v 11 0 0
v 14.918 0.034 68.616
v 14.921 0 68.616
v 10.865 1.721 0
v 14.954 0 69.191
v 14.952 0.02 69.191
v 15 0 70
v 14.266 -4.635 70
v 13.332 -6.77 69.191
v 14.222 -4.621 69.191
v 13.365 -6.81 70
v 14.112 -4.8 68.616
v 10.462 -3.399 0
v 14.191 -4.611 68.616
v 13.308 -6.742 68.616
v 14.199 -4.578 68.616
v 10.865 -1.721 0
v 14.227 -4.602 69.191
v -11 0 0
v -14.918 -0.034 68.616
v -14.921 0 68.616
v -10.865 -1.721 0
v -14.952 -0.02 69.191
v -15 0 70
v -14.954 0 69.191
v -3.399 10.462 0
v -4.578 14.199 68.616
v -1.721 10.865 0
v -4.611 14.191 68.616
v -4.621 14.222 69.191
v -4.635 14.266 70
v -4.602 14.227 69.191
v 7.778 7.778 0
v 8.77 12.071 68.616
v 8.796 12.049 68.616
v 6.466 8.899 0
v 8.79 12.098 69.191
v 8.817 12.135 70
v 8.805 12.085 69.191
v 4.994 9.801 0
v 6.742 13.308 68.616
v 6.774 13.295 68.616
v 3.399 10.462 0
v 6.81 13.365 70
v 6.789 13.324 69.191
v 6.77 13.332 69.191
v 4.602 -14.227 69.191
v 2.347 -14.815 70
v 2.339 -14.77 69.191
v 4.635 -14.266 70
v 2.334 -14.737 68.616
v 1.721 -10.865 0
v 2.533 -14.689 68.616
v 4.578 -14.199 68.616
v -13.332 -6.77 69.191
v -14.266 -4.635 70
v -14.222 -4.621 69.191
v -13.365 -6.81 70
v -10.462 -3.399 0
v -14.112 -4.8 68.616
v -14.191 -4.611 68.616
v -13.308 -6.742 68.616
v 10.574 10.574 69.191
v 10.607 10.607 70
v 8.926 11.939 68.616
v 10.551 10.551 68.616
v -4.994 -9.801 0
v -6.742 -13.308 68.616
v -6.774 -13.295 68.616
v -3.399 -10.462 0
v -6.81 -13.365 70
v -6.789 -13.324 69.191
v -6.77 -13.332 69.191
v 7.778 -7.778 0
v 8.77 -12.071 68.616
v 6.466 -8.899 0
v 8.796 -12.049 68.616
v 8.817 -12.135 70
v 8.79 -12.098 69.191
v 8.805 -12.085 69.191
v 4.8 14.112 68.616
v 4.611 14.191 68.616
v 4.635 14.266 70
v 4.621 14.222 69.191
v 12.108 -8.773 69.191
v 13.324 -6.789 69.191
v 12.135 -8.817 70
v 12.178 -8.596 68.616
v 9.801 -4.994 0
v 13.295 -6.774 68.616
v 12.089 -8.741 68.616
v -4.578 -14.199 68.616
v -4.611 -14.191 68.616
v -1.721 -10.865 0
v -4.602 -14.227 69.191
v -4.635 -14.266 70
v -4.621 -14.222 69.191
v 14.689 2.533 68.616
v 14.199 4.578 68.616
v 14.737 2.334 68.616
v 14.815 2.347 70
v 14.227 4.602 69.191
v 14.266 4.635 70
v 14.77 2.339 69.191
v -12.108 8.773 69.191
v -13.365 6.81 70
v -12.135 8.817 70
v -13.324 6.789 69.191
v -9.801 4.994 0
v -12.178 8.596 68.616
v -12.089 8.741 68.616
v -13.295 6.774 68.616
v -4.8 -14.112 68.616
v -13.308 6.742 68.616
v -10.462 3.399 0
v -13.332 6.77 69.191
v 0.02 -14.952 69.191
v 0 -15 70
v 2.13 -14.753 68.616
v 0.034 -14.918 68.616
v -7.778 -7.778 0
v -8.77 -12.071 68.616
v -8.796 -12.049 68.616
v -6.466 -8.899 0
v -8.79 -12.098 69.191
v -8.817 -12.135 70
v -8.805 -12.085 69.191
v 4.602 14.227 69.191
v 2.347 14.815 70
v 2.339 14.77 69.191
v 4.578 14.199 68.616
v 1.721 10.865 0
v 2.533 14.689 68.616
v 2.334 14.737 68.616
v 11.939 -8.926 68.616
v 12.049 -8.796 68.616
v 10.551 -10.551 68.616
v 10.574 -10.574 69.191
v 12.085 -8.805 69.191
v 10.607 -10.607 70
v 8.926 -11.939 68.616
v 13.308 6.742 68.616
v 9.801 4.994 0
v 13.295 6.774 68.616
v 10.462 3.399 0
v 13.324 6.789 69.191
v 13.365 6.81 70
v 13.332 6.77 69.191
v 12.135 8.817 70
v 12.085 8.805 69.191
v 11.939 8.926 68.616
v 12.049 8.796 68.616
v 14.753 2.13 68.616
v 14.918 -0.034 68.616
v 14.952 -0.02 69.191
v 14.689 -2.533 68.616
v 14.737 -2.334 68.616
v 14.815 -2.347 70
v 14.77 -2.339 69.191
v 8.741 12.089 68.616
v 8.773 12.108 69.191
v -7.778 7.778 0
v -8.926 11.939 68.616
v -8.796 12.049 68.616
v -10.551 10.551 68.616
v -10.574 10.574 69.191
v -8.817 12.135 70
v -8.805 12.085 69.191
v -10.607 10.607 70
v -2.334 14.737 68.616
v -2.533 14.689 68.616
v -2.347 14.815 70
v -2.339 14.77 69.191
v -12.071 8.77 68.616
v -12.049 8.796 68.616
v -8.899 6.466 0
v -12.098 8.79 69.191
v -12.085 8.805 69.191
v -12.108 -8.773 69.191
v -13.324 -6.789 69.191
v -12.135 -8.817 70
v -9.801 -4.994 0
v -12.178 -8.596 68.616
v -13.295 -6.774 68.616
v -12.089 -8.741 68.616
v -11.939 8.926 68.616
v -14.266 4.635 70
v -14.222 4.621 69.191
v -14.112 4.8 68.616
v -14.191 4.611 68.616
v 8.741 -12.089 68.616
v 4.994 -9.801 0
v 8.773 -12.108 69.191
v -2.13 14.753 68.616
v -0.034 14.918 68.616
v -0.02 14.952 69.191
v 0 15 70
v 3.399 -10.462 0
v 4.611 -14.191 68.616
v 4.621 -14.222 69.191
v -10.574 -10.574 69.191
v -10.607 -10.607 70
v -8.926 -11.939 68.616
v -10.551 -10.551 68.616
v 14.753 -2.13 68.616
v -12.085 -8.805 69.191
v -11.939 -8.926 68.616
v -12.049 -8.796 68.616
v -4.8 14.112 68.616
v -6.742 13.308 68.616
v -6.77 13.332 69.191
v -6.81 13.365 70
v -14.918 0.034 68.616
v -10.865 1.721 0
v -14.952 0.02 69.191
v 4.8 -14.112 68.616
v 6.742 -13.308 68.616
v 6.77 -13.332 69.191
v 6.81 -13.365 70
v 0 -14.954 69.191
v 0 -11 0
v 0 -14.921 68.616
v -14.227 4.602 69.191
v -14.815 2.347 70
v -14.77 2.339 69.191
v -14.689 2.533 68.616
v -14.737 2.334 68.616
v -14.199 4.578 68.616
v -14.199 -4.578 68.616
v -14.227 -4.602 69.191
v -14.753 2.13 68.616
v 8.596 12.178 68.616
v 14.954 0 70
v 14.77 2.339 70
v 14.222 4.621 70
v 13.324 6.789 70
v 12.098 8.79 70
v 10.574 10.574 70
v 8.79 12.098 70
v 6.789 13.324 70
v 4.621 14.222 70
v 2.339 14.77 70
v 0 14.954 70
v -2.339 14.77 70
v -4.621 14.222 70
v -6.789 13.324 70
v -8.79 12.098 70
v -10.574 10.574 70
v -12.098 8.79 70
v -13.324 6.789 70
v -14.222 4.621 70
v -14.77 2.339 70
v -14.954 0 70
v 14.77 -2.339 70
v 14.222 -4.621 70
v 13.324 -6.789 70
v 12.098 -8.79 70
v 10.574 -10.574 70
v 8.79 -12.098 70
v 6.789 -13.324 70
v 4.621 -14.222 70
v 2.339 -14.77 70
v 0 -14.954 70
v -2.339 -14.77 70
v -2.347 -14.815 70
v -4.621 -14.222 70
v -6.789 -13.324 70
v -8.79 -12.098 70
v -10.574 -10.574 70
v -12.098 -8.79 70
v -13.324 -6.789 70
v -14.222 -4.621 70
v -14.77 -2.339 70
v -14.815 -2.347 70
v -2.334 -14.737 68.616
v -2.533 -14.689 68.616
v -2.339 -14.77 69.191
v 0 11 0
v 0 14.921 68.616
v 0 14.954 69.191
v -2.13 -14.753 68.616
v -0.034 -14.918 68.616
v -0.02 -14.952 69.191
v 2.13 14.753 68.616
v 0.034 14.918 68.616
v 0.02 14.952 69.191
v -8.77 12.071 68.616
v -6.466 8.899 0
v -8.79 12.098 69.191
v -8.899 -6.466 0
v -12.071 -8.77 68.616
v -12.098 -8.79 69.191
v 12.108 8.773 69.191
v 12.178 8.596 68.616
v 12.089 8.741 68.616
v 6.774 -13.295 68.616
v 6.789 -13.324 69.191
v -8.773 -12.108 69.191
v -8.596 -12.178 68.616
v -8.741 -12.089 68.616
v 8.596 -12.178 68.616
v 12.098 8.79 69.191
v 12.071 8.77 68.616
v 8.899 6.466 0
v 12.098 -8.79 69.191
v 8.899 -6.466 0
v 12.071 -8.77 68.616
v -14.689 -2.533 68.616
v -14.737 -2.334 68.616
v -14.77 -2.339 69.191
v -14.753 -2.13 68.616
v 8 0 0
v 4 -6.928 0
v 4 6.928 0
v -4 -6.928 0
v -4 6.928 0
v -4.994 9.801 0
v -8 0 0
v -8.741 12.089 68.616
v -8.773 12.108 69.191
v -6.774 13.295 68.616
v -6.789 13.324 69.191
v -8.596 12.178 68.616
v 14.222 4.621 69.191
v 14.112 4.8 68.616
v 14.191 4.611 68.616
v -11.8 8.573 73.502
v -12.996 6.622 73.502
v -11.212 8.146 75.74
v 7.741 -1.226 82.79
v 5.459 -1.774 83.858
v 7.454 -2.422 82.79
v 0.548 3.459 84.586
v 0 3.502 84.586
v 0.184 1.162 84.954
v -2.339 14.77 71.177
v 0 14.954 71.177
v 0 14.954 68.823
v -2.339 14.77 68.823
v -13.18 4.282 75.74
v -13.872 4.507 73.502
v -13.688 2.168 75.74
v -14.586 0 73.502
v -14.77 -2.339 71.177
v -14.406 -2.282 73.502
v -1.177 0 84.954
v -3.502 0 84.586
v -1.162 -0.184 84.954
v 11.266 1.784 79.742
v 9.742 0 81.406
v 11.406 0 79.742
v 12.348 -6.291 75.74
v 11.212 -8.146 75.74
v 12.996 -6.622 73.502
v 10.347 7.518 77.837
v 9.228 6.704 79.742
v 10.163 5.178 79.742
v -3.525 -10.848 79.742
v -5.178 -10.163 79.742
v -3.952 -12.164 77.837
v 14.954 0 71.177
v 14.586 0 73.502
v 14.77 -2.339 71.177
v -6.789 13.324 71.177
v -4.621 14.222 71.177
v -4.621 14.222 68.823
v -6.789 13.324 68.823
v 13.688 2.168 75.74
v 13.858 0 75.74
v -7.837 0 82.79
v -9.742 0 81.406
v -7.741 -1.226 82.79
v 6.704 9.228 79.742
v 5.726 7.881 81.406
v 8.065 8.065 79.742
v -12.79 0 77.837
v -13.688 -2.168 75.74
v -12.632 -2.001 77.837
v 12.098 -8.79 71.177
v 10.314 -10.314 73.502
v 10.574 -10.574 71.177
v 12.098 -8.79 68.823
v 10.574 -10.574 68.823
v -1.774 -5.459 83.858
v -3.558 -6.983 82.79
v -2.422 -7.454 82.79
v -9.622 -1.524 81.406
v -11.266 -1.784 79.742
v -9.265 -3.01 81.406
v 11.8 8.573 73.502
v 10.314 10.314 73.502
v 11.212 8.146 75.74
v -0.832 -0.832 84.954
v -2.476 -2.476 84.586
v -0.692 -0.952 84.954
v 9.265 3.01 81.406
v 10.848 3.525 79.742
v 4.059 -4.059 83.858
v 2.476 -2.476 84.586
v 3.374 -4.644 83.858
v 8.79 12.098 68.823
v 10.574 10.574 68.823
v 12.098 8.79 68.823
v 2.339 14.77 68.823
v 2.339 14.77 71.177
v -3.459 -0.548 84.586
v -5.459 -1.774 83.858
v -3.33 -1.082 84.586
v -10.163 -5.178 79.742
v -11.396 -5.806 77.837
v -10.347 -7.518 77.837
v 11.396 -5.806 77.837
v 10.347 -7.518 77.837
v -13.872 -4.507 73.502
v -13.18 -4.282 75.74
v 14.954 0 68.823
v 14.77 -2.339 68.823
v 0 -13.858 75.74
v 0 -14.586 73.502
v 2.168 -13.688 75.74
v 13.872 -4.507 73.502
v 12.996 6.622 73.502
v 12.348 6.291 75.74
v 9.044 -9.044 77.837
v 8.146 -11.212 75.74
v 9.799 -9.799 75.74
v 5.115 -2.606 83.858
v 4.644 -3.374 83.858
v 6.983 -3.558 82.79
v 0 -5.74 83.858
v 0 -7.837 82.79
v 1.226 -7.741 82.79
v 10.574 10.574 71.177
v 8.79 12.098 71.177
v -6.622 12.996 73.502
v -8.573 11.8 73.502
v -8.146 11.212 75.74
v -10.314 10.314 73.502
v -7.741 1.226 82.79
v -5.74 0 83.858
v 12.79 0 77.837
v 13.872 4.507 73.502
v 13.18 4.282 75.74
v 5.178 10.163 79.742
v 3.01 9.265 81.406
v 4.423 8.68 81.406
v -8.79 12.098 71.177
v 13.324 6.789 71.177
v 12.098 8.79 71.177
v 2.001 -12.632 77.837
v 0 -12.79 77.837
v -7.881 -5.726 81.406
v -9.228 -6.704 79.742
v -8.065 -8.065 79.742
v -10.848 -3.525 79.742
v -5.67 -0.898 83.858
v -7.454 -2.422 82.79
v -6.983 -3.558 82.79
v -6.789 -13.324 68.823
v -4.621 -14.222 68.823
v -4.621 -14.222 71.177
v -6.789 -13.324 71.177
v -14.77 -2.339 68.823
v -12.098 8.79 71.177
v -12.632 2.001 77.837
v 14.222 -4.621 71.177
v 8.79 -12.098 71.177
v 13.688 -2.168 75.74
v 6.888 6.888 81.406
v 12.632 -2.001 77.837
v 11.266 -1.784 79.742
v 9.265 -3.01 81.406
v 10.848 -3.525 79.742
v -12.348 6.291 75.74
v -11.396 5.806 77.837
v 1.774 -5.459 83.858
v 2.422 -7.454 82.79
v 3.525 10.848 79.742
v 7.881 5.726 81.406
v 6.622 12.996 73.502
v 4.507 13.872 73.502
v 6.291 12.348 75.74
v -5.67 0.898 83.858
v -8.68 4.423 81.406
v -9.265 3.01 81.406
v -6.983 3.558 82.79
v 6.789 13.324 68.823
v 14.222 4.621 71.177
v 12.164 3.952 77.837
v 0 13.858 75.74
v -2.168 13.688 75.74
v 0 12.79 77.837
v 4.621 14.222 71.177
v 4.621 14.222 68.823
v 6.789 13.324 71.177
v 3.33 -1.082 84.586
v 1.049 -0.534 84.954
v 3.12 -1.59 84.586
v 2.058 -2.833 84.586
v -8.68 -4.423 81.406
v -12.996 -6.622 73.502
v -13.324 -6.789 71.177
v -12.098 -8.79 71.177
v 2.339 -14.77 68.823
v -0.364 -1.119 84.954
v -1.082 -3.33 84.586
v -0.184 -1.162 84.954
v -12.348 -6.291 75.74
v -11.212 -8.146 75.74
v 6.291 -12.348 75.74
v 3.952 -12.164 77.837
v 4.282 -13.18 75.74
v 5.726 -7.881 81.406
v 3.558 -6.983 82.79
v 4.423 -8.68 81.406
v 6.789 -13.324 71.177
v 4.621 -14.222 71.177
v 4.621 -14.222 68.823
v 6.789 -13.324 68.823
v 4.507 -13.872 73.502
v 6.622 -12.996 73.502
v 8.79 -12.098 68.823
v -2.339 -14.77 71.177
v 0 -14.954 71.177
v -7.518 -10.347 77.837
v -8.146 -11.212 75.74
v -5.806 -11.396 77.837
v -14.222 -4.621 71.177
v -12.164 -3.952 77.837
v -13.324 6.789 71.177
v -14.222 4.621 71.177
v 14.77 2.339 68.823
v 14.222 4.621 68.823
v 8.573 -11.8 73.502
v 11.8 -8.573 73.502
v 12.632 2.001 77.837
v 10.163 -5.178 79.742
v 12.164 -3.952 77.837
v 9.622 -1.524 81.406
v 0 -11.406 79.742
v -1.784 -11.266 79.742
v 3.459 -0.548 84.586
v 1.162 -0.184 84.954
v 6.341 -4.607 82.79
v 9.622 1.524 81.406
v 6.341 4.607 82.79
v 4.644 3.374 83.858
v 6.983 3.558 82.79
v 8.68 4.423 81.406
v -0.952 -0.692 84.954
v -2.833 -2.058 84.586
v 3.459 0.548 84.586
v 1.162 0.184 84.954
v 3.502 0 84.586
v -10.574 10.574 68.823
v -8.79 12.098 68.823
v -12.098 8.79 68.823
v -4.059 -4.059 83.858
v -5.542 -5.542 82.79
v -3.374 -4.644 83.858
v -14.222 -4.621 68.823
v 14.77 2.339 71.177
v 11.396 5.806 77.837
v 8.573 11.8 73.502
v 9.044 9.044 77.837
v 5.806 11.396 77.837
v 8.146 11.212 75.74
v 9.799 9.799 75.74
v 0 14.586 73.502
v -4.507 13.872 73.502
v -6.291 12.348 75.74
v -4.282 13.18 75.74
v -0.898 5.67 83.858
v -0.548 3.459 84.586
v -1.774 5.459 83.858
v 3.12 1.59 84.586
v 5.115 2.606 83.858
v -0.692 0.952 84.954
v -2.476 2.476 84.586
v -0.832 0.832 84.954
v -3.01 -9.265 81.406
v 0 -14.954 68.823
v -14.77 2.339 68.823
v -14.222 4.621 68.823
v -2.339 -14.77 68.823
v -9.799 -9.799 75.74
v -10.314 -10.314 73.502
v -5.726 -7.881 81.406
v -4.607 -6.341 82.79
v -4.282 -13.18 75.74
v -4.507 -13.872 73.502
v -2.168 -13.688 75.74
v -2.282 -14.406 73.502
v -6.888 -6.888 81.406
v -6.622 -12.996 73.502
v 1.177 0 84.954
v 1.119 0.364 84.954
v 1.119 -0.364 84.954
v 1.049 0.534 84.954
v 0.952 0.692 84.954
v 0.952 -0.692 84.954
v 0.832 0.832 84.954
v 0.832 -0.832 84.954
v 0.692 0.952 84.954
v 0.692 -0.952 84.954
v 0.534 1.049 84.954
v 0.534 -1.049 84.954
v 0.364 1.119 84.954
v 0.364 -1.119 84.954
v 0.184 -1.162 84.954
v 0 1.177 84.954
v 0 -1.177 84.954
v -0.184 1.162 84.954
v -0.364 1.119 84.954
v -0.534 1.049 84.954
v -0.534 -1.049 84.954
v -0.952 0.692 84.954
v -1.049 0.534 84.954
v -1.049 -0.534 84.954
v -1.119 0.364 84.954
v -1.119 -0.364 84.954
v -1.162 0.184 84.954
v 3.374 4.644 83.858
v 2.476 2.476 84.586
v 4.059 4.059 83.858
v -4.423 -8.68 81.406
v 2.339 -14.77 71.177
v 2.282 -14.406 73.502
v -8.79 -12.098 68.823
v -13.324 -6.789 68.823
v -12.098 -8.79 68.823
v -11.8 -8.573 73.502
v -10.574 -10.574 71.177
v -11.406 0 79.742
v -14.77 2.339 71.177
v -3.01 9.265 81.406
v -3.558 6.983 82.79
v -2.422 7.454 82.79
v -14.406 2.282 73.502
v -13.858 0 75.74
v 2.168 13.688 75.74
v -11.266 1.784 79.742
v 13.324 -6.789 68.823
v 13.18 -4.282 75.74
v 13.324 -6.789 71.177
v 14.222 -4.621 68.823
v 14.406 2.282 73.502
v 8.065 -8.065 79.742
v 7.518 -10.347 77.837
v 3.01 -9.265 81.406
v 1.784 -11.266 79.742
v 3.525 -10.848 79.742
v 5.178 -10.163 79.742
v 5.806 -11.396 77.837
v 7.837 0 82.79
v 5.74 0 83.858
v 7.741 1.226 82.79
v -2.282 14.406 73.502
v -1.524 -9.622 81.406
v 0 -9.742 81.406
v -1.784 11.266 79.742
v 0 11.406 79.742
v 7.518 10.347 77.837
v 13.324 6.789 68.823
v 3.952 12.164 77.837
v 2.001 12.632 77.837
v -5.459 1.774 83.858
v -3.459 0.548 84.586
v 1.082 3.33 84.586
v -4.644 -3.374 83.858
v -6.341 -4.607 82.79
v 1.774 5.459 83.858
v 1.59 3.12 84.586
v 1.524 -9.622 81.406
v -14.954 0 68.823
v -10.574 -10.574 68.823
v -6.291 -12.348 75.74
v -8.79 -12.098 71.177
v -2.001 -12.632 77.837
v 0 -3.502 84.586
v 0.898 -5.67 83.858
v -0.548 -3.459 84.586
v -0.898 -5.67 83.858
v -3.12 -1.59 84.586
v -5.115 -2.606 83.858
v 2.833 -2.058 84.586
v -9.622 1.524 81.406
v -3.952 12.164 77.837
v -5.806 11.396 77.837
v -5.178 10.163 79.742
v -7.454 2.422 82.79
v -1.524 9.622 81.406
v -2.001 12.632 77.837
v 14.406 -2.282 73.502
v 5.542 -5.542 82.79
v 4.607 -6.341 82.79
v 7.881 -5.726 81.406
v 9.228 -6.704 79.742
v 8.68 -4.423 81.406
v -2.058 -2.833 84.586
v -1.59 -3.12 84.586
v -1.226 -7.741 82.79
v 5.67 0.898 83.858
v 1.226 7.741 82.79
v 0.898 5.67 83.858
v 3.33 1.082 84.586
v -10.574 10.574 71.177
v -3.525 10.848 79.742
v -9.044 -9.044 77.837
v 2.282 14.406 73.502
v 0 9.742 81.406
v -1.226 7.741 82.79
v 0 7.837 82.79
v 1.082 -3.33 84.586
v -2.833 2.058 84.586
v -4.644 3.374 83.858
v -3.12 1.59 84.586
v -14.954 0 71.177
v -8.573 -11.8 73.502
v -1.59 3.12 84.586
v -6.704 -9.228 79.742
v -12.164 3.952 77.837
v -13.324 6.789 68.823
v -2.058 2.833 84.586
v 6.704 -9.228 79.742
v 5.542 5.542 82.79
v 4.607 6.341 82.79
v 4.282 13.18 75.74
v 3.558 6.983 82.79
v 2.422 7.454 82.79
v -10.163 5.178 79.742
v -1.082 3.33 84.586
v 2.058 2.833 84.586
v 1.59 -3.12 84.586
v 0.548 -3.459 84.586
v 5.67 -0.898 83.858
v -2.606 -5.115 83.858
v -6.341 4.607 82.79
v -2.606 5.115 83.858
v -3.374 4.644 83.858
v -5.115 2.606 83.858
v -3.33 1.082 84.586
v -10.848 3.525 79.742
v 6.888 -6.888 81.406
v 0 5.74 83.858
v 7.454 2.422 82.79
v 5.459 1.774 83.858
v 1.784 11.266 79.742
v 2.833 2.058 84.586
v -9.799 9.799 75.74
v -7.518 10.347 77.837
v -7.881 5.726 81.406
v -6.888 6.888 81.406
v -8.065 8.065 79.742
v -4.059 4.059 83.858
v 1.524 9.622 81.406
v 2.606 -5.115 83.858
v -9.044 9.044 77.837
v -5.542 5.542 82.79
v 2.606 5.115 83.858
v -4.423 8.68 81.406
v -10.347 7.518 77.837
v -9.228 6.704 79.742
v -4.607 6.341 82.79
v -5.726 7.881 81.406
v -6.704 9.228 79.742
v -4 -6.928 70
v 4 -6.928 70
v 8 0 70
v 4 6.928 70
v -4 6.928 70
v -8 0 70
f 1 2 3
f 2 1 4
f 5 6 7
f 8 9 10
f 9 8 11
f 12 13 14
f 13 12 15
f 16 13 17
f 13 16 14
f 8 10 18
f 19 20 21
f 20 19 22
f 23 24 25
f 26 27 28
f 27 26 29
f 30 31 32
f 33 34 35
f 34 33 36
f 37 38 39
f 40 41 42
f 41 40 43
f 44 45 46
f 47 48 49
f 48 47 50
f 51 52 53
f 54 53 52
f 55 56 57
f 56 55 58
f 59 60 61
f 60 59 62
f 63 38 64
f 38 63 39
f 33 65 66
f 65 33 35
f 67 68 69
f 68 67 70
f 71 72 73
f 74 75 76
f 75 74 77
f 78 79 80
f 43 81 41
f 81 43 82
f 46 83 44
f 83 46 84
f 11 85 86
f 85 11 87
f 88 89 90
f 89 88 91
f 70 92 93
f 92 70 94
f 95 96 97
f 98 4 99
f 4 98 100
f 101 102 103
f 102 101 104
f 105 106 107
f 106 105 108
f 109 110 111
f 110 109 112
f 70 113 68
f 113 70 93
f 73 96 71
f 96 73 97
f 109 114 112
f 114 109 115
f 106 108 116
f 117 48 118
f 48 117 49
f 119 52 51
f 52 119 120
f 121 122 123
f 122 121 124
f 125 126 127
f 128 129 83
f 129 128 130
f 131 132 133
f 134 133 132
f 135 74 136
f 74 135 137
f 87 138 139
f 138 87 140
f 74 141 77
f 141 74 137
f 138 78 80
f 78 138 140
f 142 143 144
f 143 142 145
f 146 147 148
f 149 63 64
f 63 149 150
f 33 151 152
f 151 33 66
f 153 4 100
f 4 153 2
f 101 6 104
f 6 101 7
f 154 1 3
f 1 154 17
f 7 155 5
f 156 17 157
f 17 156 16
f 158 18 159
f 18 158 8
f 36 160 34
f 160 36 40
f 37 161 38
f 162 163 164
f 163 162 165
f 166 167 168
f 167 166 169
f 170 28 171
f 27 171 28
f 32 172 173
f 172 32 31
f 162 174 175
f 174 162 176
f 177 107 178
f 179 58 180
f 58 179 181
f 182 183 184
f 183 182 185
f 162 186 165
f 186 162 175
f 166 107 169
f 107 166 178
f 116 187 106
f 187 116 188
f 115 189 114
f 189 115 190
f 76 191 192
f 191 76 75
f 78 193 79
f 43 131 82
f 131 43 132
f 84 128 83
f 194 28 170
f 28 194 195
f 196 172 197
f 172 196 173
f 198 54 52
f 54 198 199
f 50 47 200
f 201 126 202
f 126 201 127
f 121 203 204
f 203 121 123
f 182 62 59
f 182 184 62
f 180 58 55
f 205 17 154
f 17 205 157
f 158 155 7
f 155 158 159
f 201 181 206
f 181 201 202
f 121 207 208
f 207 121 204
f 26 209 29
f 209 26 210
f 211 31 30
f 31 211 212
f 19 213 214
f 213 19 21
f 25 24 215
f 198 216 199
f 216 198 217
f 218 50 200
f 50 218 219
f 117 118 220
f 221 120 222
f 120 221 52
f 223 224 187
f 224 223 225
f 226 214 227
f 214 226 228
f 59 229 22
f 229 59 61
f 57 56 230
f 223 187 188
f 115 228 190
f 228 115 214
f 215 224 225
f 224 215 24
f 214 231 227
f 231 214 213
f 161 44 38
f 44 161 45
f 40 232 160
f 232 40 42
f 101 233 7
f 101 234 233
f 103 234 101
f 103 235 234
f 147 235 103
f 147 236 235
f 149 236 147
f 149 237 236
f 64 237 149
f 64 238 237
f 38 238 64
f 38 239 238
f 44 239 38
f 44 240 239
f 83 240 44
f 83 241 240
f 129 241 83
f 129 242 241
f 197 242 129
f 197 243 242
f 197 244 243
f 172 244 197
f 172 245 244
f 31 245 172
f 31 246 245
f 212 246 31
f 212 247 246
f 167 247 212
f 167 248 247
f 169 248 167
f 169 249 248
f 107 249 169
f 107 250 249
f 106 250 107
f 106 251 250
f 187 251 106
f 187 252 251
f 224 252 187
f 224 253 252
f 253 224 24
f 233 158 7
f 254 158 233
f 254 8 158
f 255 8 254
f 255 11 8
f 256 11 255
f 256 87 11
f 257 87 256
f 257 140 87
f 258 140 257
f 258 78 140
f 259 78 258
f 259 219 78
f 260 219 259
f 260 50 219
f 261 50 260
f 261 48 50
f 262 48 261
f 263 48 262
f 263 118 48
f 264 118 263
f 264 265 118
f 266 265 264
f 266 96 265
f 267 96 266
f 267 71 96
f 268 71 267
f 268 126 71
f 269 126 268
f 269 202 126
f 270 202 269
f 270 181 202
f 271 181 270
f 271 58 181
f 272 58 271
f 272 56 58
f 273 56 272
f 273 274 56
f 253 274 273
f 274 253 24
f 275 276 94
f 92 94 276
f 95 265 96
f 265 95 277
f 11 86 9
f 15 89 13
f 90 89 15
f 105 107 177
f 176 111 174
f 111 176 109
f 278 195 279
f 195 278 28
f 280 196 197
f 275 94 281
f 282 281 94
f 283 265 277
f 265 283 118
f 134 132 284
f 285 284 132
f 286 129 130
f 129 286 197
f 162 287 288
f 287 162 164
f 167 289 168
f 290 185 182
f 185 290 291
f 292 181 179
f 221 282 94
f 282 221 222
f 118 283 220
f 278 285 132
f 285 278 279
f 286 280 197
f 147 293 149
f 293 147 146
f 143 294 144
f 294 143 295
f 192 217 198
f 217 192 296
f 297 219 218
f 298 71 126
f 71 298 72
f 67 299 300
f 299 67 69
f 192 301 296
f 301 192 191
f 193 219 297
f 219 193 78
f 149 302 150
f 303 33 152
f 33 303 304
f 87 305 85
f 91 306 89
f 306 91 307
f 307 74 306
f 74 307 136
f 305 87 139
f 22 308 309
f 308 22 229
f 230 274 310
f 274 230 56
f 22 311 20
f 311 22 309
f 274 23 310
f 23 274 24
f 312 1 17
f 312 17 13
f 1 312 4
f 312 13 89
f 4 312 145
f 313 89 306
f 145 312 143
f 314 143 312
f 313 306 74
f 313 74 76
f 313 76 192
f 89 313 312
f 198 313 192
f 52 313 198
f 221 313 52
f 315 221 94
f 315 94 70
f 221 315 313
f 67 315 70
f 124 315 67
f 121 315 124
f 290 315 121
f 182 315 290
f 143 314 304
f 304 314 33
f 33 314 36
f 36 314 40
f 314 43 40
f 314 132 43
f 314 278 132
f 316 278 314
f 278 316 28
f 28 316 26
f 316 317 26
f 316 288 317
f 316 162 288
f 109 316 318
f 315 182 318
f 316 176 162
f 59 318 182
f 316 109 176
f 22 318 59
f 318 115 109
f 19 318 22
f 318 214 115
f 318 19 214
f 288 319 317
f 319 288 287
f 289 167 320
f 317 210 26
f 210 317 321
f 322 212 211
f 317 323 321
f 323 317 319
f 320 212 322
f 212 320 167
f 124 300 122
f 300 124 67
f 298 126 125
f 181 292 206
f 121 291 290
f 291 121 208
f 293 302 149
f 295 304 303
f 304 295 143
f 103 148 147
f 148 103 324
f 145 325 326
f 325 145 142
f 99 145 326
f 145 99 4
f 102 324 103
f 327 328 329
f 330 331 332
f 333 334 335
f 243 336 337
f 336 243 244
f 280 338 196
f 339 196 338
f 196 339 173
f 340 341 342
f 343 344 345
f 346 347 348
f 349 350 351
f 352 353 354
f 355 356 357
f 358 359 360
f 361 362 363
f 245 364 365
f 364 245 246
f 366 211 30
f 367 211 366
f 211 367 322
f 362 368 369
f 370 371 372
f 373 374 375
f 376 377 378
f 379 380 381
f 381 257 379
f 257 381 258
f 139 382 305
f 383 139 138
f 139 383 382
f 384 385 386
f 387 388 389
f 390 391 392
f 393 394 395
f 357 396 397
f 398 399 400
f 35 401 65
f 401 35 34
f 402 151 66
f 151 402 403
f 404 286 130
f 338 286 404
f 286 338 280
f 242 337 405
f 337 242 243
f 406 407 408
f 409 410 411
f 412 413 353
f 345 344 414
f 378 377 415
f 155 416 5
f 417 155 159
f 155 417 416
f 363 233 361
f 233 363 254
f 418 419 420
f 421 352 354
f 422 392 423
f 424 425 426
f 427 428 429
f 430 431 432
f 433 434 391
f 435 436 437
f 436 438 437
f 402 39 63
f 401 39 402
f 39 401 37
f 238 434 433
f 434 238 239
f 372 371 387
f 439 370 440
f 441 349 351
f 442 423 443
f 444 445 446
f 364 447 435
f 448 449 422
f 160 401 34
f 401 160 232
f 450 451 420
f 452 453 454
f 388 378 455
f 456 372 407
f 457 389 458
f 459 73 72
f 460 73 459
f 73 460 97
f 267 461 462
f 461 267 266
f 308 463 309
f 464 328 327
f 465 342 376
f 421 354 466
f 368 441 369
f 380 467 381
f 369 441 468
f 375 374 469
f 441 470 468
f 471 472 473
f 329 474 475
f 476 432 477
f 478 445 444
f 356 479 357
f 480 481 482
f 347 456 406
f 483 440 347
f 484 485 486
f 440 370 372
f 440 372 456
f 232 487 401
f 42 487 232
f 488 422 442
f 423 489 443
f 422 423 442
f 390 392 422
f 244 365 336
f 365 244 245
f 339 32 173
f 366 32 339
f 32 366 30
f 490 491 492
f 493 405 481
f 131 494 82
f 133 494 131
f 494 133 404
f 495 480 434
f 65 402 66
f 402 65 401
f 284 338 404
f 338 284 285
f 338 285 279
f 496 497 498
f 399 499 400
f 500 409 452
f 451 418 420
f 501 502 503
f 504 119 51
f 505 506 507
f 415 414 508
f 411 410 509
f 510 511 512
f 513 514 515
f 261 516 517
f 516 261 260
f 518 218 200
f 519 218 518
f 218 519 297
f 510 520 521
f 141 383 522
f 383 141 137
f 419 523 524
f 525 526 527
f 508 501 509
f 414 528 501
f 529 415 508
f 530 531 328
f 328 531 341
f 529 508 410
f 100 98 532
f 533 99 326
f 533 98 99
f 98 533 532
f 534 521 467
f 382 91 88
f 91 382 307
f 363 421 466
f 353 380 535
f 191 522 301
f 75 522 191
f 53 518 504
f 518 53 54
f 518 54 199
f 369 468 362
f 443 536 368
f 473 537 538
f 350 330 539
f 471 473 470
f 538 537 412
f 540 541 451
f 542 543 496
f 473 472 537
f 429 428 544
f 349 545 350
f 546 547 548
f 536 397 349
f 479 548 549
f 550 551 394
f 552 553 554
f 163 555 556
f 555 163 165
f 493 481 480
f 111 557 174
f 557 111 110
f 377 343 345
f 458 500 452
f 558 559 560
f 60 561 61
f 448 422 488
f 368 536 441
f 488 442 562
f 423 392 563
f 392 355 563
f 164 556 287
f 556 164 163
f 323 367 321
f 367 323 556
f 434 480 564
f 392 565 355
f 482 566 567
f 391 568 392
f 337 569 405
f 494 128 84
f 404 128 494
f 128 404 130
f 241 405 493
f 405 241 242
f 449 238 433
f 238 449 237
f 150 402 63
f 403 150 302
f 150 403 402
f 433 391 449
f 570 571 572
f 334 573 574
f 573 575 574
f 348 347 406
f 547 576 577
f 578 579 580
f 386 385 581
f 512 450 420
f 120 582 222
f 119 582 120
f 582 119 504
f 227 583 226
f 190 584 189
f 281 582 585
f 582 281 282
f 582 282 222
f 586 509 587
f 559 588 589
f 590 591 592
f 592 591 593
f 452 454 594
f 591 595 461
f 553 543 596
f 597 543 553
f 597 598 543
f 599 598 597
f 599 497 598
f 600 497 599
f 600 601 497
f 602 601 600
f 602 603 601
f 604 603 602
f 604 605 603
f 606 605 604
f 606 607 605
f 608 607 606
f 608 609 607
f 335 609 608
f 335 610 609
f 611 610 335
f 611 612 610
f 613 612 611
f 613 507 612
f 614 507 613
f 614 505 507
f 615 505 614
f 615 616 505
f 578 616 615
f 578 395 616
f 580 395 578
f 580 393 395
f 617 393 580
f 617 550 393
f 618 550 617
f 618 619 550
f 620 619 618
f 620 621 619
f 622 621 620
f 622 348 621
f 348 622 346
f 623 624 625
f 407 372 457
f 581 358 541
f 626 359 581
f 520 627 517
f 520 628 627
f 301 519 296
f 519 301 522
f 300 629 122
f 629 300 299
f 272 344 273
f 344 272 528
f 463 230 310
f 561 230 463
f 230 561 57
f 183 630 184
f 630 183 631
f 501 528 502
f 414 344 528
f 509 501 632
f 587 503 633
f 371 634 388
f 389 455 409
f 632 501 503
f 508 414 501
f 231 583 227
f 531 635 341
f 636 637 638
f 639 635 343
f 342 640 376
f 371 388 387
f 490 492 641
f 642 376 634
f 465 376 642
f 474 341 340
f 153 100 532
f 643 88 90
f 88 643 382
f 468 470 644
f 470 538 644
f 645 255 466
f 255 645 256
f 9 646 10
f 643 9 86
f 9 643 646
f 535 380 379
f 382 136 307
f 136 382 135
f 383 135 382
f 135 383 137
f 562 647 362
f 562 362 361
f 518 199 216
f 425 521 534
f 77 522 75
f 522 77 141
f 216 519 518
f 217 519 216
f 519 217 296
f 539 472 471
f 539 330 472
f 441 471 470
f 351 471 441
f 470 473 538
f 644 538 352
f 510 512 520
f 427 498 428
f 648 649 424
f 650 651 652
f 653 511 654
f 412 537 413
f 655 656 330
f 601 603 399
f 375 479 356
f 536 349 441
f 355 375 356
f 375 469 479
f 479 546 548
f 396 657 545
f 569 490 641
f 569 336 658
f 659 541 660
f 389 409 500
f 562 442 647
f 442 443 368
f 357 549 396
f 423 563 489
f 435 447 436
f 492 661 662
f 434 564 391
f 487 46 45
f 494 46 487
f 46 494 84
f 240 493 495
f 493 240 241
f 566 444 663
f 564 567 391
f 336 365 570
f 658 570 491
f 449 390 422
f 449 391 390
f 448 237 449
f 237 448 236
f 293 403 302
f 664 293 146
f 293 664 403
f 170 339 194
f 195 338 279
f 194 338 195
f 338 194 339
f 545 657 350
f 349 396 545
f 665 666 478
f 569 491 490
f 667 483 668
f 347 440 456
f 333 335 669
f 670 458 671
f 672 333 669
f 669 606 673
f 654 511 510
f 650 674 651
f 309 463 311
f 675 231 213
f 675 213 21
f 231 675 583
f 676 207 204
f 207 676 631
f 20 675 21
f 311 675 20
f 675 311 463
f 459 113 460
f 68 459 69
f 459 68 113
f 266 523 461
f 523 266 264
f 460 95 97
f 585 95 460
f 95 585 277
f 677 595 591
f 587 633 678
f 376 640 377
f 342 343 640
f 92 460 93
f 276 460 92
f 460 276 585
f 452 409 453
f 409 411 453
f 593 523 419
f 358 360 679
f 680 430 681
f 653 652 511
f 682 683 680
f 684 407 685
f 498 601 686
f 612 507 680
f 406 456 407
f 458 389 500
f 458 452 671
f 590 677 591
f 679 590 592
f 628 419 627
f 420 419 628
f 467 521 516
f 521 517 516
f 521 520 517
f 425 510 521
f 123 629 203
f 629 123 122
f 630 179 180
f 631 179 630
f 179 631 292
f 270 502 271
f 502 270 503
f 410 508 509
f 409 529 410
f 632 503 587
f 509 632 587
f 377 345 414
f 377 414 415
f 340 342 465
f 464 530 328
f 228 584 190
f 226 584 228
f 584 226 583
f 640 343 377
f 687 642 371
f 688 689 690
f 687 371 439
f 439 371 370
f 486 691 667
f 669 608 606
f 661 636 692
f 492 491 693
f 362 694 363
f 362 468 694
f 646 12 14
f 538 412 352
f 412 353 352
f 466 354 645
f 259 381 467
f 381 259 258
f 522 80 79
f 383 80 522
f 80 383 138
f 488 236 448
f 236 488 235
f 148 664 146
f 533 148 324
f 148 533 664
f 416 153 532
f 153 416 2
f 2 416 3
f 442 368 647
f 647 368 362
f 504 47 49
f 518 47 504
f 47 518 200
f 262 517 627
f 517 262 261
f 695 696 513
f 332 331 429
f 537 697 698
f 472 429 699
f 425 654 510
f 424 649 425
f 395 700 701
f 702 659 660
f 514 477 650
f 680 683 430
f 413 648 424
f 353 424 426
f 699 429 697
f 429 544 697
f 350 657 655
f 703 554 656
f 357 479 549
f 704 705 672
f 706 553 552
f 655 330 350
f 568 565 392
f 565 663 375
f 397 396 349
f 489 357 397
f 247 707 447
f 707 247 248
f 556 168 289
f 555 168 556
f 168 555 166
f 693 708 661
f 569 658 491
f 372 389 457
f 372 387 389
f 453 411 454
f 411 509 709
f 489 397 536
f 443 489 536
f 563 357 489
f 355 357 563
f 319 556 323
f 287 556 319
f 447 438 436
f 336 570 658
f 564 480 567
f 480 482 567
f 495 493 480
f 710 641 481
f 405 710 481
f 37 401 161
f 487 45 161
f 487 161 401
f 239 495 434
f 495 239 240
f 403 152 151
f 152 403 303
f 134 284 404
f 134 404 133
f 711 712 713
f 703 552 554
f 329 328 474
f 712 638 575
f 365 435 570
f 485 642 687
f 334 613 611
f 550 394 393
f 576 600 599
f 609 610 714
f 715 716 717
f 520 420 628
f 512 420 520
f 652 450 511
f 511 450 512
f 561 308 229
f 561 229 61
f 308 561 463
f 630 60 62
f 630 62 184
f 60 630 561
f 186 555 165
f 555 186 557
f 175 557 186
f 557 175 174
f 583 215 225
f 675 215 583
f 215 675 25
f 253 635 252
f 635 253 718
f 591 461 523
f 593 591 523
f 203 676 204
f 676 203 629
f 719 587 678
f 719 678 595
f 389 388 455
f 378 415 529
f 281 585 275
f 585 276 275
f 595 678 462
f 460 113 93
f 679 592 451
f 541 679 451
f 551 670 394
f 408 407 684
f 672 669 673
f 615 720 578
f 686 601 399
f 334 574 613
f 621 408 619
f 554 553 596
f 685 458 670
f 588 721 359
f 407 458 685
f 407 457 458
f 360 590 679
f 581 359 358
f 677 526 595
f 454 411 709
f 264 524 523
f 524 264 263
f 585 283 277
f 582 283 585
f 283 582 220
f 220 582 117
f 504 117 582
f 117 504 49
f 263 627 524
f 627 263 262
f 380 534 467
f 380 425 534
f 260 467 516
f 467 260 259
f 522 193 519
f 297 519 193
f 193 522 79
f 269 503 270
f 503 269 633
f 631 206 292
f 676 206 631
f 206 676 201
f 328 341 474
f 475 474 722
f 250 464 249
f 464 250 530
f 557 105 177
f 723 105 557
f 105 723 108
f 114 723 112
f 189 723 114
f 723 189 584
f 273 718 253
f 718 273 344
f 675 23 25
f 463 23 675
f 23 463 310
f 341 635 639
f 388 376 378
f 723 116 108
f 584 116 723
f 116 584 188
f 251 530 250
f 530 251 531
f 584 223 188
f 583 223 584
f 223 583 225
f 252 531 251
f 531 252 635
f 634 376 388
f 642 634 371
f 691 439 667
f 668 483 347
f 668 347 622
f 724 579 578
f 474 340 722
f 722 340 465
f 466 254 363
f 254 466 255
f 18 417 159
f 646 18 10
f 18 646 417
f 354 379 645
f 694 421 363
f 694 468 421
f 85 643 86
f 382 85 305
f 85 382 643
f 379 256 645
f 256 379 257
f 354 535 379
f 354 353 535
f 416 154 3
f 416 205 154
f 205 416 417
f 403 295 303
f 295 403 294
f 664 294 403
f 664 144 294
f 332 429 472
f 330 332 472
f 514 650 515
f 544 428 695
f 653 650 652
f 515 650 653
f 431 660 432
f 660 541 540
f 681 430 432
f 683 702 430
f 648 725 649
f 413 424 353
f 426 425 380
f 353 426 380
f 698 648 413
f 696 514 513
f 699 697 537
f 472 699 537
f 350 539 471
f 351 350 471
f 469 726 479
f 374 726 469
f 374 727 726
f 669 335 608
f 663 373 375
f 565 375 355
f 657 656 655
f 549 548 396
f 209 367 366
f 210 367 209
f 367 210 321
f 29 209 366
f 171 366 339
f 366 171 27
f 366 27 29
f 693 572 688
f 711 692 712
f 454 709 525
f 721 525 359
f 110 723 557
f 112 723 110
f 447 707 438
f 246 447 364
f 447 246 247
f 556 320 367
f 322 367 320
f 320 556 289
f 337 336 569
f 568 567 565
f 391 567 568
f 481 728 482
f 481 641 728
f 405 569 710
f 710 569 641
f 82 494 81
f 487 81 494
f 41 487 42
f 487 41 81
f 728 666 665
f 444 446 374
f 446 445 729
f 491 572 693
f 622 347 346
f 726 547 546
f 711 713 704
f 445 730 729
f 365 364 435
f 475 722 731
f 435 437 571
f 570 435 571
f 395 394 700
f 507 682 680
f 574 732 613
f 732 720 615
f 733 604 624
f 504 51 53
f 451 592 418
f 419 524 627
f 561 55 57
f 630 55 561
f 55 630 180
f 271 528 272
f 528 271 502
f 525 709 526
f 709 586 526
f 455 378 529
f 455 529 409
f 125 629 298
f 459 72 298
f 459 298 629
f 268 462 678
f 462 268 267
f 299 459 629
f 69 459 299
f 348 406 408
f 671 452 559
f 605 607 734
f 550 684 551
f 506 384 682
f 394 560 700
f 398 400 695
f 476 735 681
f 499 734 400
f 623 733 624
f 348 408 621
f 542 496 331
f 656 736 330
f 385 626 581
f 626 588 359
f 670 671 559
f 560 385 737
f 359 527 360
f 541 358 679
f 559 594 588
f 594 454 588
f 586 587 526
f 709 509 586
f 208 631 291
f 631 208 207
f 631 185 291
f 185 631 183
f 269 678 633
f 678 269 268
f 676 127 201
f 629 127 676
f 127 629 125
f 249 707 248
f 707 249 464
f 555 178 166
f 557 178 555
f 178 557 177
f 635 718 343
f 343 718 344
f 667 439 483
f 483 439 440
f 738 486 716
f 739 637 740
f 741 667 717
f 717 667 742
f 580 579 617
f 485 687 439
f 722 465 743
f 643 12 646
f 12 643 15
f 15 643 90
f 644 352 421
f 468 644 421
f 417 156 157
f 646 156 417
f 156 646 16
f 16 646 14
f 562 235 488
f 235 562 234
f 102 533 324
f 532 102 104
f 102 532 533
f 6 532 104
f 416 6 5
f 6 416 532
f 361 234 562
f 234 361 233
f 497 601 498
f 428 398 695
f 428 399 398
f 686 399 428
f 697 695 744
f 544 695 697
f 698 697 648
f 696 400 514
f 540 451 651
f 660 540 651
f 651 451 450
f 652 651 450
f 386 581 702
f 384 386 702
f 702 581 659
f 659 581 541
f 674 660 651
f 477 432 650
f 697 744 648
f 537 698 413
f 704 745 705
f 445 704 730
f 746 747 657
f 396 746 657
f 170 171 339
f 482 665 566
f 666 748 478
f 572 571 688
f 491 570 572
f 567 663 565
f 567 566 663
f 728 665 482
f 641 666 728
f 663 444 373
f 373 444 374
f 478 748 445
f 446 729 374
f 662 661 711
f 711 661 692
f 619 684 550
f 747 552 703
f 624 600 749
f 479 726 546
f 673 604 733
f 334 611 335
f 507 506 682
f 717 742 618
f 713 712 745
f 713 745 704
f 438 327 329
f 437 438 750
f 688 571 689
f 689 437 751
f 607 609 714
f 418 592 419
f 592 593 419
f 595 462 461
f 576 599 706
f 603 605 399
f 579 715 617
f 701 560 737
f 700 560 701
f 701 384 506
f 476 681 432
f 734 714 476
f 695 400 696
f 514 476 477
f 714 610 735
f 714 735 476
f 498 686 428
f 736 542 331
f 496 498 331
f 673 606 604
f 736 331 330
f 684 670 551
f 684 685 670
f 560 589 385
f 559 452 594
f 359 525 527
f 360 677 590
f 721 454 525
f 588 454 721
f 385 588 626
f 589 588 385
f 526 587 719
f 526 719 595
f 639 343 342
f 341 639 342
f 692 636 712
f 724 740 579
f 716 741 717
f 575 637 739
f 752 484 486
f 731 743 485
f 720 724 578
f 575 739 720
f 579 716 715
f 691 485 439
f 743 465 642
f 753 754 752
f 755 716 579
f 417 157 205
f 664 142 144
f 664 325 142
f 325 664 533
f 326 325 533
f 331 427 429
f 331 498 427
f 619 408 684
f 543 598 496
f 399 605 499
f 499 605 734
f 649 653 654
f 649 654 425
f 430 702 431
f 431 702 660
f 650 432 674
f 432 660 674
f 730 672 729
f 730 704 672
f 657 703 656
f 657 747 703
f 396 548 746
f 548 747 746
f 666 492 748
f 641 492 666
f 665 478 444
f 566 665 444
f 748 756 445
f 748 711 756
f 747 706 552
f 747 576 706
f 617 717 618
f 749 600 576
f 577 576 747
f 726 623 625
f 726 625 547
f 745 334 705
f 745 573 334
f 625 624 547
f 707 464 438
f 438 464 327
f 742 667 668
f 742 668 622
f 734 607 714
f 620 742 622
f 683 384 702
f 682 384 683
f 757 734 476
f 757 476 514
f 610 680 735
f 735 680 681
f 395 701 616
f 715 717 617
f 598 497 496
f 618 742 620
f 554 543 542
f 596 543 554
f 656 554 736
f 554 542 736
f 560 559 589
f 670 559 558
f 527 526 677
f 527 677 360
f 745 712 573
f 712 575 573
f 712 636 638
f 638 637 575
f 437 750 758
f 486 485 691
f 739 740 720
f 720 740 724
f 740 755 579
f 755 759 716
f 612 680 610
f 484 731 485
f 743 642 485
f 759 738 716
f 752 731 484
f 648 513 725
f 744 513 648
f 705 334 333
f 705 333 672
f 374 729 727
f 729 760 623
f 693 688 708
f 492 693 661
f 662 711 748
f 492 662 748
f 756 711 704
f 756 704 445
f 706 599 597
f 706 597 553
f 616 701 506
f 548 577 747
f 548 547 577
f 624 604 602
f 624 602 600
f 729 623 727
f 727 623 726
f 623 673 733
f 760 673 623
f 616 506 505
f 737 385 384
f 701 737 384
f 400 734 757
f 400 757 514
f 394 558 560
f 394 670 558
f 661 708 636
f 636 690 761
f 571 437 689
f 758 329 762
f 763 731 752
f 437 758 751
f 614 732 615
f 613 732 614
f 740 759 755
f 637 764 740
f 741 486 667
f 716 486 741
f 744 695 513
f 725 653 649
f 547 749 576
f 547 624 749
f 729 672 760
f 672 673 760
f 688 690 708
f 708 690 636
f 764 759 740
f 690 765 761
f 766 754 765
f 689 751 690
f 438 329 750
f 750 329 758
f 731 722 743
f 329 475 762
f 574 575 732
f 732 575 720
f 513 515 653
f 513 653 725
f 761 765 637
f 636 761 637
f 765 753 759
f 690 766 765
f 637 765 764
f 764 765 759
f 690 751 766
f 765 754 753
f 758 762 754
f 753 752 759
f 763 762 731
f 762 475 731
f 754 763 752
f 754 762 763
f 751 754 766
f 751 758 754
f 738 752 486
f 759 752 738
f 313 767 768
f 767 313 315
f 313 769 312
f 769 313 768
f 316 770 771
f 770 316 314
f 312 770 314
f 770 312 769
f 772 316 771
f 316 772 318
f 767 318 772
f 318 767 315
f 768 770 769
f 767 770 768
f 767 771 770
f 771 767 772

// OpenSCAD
AXIS_DIAM = 16;
LENGTH = 70;
DIAM1 = 22;
DIAM2 = 30;



difference() {
    union () {
        cylinder(d1 = DIAM1, d2 = DIAM2, h = LENGTH, $fn = 40);
        translate([0, 0, LENGTH]) sphere(d = DIAM2, $fn = 40);
    }
    cylinder(d = AXIS_DIAM, h = LENGTH, $fn = 6);
}
